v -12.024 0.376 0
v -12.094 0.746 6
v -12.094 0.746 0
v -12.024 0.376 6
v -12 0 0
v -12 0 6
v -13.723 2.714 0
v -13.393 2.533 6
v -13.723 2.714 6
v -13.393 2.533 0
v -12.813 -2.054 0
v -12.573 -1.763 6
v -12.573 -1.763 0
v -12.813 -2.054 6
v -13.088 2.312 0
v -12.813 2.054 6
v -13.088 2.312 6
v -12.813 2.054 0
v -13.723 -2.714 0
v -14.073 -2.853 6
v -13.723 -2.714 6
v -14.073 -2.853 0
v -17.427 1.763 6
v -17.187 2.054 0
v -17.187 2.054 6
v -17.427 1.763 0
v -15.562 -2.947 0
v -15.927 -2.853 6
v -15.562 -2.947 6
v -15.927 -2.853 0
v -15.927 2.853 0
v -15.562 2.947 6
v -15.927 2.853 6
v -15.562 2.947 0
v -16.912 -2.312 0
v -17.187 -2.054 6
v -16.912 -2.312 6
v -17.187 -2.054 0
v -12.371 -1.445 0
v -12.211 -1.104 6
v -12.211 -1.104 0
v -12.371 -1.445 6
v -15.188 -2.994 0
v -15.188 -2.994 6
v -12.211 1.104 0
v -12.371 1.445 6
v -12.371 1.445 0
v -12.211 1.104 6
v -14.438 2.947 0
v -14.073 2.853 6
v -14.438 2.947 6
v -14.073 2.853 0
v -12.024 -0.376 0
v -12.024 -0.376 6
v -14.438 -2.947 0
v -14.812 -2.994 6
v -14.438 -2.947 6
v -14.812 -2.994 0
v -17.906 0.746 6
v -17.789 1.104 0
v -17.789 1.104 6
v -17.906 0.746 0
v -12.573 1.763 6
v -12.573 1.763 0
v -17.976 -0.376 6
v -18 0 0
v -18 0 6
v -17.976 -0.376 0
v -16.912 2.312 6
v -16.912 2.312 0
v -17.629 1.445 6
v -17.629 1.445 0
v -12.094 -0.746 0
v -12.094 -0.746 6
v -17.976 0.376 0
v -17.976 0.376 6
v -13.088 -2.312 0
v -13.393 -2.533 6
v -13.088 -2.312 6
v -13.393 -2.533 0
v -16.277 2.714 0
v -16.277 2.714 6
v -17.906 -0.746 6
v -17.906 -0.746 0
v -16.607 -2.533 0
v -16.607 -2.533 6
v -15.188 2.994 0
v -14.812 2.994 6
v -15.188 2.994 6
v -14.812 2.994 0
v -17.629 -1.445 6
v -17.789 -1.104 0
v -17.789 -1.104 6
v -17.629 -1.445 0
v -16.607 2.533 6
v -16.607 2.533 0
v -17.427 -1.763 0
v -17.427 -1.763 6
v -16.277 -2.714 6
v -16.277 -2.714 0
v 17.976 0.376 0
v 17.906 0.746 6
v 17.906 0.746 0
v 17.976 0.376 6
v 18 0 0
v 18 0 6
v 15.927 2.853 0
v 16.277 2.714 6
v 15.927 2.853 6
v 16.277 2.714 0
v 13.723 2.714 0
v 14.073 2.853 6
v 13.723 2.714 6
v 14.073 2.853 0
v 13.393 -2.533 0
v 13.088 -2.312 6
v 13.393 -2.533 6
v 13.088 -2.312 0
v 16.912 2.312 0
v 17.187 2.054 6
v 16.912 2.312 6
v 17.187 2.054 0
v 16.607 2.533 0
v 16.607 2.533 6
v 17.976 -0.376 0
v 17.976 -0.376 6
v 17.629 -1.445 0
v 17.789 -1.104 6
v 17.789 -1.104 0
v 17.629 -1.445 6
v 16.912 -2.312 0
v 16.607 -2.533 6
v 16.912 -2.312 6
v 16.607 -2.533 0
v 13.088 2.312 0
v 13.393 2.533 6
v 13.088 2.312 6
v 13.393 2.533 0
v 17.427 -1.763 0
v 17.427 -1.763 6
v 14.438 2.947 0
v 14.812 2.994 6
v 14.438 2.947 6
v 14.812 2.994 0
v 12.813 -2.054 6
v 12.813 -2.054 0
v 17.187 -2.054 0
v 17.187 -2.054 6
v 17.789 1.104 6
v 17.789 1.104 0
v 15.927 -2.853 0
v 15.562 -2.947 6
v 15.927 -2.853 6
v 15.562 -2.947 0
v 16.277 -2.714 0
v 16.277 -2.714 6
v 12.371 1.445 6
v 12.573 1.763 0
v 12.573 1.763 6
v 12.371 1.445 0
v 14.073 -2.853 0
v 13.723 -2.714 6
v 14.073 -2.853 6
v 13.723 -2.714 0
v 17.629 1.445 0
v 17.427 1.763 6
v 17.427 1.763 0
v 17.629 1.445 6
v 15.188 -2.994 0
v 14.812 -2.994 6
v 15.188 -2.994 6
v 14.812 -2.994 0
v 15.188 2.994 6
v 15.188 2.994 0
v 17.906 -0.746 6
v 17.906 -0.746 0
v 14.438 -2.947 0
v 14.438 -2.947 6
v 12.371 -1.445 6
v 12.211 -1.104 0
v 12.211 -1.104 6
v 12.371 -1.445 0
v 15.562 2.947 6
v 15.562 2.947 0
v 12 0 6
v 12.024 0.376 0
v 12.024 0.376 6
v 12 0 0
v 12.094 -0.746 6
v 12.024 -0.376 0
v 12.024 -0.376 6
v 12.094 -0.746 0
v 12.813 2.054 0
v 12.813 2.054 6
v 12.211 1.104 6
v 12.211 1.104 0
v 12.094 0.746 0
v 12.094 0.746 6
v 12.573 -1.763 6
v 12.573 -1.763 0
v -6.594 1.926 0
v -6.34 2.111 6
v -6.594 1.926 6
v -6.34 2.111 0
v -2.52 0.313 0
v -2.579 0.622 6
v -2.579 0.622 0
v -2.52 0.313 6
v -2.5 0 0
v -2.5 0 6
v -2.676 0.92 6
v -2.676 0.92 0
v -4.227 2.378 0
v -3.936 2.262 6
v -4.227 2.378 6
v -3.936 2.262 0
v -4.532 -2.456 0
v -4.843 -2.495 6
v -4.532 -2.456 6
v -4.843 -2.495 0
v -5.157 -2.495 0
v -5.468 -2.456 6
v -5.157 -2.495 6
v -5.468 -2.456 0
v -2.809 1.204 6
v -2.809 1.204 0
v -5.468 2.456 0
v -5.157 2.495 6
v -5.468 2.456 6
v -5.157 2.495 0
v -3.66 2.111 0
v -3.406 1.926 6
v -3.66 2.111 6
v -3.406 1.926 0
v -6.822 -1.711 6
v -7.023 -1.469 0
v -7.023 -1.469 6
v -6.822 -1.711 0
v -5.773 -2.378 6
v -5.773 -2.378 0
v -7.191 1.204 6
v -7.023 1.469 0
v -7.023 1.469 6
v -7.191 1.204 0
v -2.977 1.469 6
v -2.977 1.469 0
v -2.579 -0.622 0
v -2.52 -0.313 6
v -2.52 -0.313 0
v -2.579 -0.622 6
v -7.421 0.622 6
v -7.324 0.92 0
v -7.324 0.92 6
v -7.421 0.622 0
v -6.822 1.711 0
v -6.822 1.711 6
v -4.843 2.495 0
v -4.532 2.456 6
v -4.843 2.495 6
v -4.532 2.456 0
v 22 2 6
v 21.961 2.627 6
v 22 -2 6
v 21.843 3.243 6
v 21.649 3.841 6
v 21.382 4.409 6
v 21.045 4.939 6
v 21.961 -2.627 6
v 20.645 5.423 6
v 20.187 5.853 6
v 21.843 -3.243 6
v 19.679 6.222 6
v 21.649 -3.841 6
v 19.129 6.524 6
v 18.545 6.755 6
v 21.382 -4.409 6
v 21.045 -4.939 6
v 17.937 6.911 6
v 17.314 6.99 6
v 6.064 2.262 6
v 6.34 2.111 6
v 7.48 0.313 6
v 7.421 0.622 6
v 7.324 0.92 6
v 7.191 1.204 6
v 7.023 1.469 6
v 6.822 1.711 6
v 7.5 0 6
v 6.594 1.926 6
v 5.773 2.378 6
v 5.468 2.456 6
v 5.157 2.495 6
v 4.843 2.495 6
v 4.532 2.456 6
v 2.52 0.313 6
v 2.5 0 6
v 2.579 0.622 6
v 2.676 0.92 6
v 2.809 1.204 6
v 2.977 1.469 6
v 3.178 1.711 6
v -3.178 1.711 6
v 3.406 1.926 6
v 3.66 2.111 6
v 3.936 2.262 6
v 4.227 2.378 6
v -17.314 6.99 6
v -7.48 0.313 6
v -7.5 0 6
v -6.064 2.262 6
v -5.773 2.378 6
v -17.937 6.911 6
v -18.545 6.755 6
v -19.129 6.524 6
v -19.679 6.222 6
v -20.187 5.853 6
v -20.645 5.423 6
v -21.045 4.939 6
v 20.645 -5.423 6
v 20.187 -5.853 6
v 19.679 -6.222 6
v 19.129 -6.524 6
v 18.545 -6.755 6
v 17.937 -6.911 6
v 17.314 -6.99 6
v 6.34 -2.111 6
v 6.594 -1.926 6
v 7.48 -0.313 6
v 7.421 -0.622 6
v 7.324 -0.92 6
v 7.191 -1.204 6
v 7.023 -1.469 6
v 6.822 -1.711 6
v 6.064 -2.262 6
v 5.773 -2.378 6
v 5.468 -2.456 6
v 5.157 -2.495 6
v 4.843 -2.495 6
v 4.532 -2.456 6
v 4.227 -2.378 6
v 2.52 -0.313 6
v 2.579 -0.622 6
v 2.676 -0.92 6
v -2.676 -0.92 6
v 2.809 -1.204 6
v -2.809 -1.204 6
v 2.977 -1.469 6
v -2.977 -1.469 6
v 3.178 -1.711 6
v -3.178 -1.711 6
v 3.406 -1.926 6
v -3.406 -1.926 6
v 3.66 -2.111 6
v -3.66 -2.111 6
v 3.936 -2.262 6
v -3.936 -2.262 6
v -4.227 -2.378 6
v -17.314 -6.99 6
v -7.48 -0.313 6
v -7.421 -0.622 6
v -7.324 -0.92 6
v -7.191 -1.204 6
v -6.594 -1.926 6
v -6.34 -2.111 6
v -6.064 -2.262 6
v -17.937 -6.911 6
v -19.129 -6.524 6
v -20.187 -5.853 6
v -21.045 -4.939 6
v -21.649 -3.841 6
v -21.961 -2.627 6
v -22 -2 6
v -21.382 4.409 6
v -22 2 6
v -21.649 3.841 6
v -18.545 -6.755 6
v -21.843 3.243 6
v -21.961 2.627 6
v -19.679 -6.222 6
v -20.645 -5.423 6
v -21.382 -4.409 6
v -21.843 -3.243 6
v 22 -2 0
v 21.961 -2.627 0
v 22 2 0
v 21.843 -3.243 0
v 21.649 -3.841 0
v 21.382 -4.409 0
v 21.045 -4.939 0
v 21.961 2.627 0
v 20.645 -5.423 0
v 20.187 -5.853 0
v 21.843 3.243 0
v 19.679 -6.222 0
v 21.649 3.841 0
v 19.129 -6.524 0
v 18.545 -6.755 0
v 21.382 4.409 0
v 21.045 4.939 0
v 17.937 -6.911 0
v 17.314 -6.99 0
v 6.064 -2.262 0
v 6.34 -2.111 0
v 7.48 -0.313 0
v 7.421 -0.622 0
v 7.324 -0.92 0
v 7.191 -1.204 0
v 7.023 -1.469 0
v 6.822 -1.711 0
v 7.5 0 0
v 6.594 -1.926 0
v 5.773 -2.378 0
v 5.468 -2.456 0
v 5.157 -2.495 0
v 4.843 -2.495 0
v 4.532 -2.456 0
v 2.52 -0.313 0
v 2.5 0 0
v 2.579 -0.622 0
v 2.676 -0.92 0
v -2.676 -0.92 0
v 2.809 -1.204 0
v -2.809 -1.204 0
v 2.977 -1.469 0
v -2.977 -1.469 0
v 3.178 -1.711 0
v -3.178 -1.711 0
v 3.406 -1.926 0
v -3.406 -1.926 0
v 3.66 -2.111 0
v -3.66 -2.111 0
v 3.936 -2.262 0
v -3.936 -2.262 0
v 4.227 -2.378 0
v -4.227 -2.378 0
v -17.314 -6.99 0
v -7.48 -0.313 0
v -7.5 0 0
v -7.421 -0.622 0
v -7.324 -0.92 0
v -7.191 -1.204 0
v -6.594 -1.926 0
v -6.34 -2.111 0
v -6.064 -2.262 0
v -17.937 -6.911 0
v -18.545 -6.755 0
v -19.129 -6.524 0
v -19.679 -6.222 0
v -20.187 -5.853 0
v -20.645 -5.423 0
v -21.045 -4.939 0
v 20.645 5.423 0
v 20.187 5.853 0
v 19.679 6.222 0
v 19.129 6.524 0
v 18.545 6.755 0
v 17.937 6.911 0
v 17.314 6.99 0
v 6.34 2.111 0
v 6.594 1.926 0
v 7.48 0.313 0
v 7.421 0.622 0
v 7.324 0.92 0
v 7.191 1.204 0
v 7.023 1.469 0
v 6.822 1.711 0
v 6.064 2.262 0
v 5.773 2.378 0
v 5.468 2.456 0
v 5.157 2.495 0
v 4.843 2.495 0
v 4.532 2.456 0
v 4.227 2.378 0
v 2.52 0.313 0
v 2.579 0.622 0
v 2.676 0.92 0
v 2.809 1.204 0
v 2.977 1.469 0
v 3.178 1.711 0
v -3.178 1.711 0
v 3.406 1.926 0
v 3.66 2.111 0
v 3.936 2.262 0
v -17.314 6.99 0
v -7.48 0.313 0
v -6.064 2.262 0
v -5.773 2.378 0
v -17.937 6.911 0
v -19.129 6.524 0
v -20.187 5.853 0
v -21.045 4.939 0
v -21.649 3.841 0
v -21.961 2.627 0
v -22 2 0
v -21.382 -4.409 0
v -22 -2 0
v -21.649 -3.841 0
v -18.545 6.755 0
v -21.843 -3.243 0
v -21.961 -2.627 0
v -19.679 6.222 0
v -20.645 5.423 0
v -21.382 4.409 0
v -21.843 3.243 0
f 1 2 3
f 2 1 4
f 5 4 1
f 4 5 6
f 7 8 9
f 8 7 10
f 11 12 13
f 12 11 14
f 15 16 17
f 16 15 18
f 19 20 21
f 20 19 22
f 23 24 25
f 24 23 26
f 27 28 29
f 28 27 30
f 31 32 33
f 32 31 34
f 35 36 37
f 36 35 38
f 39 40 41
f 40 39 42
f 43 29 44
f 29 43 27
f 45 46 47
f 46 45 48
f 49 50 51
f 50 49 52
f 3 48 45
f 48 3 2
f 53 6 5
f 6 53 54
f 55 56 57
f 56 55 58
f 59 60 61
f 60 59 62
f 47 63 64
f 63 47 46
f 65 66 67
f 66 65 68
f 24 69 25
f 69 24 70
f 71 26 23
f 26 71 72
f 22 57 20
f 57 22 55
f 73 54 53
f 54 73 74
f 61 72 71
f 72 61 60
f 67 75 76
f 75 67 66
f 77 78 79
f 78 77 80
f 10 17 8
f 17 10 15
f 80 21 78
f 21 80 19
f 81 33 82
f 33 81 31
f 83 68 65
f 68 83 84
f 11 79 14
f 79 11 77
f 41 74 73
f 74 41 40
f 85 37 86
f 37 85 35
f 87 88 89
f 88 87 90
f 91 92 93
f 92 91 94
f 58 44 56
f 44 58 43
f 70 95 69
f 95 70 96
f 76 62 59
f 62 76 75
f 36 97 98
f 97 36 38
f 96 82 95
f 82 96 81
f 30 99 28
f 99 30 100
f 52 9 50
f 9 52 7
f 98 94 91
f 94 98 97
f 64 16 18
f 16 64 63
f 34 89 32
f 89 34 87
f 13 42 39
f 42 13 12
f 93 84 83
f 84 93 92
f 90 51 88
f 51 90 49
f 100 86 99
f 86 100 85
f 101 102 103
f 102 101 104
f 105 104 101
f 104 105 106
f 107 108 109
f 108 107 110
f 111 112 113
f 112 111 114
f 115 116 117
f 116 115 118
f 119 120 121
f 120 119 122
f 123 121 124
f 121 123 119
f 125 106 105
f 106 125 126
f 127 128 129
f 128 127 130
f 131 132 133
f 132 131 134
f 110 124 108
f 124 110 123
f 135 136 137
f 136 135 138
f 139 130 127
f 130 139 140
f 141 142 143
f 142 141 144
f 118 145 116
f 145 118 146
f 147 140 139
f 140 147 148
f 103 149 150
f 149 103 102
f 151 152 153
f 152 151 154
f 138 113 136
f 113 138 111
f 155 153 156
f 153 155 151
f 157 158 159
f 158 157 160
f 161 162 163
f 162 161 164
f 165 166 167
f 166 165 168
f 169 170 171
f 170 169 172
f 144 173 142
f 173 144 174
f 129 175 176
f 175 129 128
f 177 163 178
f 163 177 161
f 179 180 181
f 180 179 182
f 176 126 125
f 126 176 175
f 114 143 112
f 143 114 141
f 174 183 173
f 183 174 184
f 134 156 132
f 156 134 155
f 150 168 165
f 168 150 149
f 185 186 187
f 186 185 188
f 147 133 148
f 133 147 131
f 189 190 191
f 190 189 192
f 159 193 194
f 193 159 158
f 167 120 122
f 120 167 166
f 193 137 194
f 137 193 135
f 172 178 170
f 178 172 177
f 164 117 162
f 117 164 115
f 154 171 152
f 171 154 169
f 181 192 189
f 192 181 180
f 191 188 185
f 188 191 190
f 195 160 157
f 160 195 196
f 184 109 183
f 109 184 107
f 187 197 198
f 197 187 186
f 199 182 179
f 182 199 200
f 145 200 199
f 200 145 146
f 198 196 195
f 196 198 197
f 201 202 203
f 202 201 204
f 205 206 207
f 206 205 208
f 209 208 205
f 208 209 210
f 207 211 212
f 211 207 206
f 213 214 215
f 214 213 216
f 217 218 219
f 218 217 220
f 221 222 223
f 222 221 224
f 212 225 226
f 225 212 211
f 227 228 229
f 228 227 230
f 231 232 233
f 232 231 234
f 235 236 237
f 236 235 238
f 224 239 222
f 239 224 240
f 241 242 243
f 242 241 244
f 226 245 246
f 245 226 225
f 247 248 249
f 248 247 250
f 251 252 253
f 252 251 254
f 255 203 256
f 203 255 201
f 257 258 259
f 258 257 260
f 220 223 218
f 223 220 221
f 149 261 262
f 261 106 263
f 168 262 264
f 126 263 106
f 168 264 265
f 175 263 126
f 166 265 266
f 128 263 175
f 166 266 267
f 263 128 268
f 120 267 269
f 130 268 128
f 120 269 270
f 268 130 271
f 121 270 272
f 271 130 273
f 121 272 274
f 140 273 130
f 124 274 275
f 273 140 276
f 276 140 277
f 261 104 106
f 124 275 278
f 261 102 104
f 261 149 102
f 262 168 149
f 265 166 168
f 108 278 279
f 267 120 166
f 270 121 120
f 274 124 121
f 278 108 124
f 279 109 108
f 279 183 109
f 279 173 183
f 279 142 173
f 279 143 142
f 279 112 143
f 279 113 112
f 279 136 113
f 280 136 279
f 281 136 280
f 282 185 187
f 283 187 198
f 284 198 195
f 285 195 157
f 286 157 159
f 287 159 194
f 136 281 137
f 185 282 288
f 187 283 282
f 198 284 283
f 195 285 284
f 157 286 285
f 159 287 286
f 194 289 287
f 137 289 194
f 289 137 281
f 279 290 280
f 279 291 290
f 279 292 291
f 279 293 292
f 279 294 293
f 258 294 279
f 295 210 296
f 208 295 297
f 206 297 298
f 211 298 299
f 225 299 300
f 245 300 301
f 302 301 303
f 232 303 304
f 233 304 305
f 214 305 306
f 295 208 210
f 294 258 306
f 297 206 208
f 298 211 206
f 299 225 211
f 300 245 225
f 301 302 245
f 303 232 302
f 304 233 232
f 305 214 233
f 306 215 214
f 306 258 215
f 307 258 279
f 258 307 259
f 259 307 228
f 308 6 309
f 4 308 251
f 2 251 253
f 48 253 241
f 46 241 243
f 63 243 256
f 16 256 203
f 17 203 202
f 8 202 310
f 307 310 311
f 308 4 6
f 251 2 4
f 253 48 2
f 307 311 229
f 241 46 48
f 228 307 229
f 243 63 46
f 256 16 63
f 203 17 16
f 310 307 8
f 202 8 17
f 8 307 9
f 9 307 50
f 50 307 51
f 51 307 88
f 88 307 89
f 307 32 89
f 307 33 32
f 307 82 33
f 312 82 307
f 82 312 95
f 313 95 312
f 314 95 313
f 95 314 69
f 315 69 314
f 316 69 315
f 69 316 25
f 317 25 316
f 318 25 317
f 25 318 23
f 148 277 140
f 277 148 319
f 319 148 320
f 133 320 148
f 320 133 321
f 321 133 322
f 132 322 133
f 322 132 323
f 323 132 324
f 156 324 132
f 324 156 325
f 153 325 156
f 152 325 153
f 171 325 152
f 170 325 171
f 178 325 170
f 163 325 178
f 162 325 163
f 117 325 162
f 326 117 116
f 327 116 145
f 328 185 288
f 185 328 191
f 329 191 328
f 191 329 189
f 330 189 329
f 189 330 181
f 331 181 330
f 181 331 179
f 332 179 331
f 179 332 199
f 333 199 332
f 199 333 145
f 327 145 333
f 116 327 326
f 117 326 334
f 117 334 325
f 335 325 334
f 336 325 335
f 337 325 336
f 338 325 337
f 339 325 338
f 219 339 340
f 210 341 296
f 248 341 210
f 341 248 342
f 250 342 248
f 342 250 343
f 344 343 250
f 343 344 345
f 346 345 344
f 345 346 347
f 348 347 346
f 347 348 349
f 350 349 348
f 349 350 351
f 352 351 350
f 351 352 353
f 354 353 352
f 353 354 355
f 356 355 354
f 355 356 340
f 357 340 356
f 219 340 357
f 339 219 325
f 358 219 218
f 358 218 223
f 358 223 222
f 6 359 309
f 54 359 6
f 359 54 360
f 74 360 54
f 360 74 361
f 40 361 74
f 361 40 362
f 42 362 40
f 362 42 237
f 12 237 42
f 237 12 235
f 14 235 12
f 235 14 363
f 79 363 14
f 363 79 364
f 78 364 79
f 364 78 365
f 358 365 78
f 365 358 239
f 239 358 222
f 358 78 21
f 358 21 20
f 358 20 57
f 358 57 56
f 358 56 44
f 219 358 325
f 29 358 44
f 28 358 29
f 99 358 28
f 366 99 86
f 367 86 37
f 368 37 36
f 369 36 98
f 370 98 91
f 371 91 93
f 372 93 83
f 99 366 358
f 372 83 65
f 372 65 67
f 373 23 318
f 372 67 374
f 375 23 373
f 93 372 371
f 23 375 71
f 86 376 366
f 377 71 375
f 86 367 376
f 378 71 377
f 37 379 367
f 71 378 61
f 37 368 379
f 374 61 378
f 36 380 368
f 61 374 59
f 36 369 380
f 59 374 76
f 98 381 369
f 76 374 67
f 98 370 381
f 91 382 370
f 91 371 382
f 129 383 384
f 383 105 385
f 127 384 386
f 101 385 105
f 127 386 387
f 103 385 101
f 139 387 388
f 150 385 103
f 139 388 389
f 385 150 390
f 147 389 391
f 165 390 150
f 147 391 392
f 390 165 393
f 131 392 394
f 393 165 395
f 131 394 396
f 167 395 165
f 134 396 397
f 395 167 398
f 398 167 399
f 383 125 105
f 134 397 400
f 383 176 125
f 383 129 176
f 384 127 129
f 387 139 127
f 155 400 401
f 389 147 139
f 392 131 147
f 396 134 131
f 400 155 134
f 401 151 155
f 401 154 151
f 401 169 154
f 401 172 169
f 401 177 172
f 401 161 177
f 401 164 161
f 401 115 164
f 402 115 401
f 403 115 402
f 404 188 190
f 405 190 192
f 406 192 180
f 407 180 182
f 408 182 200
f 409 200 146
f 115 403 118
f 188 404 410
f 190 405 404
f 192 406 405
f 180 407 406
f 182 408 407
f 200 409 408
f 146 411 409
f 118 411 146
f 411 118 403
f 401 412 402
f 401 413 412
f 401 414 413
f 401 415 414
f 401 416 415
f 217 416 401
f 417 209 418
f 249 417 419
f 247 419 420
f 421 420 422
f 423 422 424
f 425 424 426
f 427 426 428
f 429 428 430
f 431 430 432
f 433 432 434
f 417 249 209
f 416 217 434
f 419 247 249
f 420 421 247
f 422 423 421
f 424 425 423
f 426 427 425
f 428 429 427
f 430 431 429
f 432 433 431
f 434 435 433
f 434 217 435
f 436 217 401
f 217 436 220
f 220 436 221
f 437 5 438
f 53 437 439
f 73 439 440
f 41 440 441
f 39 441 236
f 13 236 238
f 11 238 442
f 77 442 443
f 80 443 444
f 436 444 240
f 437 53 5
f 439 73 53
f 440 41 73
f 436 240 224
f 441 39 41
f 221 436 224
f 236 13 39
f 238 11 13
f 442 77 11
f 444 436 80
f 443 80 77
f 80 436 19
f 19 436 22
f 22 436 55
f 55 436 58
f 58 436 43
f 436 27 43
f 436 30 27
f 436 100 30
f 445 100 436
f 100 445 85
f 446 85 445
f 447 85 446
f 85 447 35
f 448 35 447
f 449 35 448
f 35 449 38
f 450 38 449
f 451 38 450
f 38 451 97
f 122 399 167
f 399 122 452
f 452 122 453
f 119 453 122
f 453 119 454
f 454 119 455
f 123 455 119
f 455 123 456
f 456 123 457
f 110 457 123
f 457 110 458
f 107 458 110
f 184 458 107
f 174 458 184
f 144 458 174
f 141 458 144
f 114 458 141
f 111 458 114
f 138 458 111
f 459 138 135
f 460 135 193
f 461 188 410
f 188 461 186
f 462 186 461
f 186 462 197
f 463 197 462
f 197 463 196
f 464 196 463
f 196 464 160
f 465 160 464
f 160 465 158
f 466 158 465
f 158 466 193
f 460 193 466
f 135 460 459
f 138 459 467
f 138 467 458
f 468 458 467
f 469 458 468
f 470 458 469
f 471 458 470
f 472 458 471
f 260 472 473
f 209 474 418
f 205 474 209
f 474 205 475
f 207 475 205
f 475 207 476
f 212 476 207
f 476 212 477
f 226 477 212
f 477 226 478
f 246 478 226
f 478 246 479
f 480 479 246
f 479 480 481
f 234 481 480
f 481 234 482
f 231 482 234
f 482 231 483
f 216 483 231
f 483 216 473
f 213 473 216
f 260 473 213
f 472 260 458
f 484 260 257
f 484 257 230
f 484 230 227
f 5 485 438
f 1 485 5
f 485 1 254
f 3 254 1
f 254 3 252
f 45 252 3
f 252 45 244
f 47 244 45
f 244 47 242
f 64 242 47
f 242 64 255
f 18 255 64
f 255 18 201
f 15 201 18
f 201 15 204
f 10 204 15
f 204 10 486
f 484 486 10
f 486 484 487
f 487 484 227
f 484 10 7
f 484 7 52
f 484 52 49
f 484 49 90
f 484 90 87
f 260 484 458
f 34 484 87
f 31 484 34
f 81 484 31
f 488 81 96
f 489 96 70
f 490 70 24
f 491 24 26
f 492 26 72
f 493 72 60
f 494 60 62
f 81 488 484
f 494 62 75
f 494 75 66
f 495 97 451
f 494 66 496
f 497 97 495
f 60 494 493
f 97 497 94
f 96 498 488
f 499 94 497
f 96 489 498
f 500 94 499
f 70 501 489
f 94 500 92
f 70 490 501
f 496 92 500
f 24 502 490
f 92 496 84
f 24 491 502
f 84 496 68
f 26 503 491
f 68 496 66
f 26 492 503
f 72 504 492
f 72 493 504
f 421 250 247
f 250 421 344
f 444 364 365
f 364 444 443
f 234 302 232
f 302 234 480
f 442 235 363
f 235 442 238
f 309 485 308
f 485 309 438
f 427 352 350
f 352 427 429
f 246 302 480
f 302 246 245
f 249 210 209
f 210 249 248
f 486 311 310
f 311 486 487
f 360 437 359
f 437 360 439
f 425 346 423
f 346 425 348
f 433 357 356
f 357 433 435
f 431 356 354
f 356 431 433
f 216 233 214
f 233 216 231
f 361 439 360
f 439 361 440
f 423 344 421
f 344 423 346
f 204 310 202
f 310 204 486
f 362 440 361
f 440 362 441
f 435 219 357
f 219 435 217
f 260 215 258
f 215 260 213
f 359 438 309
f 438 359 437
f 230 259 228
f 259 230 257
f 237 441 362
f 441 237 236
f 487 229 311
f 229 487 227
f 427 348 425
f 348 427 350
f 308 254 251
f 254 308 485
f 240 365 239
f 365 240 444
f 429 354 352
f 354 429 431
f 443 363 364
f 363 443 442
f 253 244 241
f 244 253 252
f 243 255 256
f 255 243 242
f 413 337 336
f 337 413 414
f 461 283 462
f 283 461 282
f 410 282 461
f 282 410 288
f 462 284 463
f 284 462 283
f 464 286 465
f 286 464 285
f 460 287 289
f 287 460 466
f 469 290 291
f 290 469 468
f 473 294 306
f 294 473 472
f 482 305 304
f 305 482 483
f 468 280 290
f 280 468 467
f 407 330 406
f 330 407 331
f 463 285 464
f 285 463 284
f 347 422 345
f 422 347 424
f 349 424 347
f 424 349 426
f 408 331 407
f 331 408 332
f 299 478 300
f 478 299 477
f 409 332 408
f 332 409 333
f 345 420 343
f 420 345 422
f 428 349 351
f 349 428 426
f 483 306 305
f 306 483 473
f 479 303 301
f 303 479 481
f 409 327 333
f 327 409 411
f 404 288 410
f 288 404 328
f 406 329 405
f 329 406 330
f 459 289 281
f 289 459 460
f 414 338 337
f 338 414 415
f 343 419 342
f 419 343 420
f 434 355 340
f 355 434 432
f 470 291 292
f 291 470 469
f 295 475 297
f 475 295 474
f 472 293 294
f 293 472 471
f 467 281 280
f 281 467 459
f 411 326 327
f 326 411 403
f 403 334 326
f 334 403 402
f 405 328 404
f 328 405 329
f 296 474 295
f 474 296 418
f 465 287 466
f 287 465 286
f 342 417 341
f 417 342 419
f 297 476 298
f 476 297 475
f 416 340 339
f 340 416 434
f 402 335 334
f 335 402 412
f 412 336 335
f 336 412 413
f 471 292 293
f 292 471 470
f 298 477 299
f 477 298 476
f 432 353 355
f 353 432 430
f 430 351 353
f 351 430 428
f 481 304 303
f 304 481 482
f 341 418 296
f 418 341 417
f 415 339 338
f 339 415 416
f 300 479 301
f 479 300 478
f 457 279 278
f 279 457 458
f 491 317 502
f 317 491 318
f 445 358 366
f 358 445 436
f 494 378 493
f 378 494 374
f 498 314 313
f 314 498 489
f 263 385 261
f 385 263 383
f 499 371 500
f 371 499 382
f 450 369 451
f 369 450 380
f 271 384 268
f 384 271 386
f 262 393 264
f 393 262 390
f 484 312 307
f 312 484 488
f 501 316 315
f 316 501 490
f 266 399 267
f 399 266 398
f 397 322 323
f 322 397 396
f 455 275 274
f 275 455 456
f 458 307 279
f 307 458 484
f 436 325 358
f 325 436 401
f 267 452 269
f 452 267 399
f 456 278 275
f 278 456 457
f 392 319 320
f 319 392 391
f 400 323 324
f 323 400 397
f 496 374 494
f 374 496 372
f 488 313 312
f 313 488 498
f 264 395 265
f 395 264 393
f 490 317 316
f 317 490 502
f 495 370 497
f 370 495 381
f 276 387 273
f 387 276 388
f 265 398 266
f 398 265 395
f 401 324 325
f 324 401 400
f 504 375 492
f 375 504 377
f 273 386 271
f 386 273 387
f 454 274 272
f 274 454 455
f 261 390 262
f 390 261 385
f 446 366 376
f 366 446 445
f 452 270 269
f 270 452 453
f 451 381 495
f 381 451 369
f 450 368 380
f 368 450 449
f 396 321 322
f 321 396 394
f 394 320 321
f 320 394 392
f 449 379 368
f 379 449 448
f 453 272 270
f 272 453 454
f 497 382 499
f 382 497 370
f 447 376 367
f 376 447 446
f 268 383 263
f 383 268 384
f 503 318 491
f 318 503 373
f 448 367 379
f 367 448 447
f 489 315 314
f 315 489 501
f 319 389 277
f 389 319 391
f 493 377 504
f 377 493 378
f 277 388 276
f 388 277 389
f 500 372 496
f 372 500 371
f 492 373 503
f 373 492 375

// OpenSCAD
$fn = 50;


difference() {
	union() {
		hull() {
			translate(v = [-17.0000000000, 2.0000000000, 0]) {
				cylinder(h = 6, r = 5);
			}
			translate(v = [17.0000000000, 2.0000000000, 0]) {
				cylinder(h = 6, r = 5);
			}
			translate(v = [-17.0000000000, -2.0000000000, 0]) {
				cylinder(h = 6, r = 5);
			}
			translate(v = [17.0000000000, -2.0000000000, 0]) {
				cylinder(h = 6, r = 5);
			}
		}
	}
	union() {
		#translate(v = [-15.0000000000, 0.0000000000, -100.0000000000]) {
			cylinder(h = 200, r = 3.0000000000);
		}
		#translate(v = [-15.0000000000, 0.0000000000, -100.0000000000]) {
			cylinder(h = 200, r = 3.0000000000);
		}
		#translate(v = [15.0000000000, 0.0000000000, -100.0000000000]) {
			cylinder(h = 200, r = 3.0000000000);
		}
		#translate(v = [15.0000000000, 0.0000000000, -100.0000000000]) {
			cylinder(h = 200, r = 3.0000000000);
		}
		#translate(v = [-15.0000000000, 0, 0]) {
			cylinder(h = 6, r = 2.5000000000);
		}
		#translate(v = [-5.0000000000, 0, 0]) {
			cylinder(h = 6, r = 2.5000000000);
		}
		#translate(v = [5.0000000000, 0, 0]) {
			cylinder(h = 6, r = 2.5000000000);
		}
		#translate(v = [15.0000000000, 0, 0]) {
			cylinder(h = 6, r = 2.5000000000);
		}
	}
}
